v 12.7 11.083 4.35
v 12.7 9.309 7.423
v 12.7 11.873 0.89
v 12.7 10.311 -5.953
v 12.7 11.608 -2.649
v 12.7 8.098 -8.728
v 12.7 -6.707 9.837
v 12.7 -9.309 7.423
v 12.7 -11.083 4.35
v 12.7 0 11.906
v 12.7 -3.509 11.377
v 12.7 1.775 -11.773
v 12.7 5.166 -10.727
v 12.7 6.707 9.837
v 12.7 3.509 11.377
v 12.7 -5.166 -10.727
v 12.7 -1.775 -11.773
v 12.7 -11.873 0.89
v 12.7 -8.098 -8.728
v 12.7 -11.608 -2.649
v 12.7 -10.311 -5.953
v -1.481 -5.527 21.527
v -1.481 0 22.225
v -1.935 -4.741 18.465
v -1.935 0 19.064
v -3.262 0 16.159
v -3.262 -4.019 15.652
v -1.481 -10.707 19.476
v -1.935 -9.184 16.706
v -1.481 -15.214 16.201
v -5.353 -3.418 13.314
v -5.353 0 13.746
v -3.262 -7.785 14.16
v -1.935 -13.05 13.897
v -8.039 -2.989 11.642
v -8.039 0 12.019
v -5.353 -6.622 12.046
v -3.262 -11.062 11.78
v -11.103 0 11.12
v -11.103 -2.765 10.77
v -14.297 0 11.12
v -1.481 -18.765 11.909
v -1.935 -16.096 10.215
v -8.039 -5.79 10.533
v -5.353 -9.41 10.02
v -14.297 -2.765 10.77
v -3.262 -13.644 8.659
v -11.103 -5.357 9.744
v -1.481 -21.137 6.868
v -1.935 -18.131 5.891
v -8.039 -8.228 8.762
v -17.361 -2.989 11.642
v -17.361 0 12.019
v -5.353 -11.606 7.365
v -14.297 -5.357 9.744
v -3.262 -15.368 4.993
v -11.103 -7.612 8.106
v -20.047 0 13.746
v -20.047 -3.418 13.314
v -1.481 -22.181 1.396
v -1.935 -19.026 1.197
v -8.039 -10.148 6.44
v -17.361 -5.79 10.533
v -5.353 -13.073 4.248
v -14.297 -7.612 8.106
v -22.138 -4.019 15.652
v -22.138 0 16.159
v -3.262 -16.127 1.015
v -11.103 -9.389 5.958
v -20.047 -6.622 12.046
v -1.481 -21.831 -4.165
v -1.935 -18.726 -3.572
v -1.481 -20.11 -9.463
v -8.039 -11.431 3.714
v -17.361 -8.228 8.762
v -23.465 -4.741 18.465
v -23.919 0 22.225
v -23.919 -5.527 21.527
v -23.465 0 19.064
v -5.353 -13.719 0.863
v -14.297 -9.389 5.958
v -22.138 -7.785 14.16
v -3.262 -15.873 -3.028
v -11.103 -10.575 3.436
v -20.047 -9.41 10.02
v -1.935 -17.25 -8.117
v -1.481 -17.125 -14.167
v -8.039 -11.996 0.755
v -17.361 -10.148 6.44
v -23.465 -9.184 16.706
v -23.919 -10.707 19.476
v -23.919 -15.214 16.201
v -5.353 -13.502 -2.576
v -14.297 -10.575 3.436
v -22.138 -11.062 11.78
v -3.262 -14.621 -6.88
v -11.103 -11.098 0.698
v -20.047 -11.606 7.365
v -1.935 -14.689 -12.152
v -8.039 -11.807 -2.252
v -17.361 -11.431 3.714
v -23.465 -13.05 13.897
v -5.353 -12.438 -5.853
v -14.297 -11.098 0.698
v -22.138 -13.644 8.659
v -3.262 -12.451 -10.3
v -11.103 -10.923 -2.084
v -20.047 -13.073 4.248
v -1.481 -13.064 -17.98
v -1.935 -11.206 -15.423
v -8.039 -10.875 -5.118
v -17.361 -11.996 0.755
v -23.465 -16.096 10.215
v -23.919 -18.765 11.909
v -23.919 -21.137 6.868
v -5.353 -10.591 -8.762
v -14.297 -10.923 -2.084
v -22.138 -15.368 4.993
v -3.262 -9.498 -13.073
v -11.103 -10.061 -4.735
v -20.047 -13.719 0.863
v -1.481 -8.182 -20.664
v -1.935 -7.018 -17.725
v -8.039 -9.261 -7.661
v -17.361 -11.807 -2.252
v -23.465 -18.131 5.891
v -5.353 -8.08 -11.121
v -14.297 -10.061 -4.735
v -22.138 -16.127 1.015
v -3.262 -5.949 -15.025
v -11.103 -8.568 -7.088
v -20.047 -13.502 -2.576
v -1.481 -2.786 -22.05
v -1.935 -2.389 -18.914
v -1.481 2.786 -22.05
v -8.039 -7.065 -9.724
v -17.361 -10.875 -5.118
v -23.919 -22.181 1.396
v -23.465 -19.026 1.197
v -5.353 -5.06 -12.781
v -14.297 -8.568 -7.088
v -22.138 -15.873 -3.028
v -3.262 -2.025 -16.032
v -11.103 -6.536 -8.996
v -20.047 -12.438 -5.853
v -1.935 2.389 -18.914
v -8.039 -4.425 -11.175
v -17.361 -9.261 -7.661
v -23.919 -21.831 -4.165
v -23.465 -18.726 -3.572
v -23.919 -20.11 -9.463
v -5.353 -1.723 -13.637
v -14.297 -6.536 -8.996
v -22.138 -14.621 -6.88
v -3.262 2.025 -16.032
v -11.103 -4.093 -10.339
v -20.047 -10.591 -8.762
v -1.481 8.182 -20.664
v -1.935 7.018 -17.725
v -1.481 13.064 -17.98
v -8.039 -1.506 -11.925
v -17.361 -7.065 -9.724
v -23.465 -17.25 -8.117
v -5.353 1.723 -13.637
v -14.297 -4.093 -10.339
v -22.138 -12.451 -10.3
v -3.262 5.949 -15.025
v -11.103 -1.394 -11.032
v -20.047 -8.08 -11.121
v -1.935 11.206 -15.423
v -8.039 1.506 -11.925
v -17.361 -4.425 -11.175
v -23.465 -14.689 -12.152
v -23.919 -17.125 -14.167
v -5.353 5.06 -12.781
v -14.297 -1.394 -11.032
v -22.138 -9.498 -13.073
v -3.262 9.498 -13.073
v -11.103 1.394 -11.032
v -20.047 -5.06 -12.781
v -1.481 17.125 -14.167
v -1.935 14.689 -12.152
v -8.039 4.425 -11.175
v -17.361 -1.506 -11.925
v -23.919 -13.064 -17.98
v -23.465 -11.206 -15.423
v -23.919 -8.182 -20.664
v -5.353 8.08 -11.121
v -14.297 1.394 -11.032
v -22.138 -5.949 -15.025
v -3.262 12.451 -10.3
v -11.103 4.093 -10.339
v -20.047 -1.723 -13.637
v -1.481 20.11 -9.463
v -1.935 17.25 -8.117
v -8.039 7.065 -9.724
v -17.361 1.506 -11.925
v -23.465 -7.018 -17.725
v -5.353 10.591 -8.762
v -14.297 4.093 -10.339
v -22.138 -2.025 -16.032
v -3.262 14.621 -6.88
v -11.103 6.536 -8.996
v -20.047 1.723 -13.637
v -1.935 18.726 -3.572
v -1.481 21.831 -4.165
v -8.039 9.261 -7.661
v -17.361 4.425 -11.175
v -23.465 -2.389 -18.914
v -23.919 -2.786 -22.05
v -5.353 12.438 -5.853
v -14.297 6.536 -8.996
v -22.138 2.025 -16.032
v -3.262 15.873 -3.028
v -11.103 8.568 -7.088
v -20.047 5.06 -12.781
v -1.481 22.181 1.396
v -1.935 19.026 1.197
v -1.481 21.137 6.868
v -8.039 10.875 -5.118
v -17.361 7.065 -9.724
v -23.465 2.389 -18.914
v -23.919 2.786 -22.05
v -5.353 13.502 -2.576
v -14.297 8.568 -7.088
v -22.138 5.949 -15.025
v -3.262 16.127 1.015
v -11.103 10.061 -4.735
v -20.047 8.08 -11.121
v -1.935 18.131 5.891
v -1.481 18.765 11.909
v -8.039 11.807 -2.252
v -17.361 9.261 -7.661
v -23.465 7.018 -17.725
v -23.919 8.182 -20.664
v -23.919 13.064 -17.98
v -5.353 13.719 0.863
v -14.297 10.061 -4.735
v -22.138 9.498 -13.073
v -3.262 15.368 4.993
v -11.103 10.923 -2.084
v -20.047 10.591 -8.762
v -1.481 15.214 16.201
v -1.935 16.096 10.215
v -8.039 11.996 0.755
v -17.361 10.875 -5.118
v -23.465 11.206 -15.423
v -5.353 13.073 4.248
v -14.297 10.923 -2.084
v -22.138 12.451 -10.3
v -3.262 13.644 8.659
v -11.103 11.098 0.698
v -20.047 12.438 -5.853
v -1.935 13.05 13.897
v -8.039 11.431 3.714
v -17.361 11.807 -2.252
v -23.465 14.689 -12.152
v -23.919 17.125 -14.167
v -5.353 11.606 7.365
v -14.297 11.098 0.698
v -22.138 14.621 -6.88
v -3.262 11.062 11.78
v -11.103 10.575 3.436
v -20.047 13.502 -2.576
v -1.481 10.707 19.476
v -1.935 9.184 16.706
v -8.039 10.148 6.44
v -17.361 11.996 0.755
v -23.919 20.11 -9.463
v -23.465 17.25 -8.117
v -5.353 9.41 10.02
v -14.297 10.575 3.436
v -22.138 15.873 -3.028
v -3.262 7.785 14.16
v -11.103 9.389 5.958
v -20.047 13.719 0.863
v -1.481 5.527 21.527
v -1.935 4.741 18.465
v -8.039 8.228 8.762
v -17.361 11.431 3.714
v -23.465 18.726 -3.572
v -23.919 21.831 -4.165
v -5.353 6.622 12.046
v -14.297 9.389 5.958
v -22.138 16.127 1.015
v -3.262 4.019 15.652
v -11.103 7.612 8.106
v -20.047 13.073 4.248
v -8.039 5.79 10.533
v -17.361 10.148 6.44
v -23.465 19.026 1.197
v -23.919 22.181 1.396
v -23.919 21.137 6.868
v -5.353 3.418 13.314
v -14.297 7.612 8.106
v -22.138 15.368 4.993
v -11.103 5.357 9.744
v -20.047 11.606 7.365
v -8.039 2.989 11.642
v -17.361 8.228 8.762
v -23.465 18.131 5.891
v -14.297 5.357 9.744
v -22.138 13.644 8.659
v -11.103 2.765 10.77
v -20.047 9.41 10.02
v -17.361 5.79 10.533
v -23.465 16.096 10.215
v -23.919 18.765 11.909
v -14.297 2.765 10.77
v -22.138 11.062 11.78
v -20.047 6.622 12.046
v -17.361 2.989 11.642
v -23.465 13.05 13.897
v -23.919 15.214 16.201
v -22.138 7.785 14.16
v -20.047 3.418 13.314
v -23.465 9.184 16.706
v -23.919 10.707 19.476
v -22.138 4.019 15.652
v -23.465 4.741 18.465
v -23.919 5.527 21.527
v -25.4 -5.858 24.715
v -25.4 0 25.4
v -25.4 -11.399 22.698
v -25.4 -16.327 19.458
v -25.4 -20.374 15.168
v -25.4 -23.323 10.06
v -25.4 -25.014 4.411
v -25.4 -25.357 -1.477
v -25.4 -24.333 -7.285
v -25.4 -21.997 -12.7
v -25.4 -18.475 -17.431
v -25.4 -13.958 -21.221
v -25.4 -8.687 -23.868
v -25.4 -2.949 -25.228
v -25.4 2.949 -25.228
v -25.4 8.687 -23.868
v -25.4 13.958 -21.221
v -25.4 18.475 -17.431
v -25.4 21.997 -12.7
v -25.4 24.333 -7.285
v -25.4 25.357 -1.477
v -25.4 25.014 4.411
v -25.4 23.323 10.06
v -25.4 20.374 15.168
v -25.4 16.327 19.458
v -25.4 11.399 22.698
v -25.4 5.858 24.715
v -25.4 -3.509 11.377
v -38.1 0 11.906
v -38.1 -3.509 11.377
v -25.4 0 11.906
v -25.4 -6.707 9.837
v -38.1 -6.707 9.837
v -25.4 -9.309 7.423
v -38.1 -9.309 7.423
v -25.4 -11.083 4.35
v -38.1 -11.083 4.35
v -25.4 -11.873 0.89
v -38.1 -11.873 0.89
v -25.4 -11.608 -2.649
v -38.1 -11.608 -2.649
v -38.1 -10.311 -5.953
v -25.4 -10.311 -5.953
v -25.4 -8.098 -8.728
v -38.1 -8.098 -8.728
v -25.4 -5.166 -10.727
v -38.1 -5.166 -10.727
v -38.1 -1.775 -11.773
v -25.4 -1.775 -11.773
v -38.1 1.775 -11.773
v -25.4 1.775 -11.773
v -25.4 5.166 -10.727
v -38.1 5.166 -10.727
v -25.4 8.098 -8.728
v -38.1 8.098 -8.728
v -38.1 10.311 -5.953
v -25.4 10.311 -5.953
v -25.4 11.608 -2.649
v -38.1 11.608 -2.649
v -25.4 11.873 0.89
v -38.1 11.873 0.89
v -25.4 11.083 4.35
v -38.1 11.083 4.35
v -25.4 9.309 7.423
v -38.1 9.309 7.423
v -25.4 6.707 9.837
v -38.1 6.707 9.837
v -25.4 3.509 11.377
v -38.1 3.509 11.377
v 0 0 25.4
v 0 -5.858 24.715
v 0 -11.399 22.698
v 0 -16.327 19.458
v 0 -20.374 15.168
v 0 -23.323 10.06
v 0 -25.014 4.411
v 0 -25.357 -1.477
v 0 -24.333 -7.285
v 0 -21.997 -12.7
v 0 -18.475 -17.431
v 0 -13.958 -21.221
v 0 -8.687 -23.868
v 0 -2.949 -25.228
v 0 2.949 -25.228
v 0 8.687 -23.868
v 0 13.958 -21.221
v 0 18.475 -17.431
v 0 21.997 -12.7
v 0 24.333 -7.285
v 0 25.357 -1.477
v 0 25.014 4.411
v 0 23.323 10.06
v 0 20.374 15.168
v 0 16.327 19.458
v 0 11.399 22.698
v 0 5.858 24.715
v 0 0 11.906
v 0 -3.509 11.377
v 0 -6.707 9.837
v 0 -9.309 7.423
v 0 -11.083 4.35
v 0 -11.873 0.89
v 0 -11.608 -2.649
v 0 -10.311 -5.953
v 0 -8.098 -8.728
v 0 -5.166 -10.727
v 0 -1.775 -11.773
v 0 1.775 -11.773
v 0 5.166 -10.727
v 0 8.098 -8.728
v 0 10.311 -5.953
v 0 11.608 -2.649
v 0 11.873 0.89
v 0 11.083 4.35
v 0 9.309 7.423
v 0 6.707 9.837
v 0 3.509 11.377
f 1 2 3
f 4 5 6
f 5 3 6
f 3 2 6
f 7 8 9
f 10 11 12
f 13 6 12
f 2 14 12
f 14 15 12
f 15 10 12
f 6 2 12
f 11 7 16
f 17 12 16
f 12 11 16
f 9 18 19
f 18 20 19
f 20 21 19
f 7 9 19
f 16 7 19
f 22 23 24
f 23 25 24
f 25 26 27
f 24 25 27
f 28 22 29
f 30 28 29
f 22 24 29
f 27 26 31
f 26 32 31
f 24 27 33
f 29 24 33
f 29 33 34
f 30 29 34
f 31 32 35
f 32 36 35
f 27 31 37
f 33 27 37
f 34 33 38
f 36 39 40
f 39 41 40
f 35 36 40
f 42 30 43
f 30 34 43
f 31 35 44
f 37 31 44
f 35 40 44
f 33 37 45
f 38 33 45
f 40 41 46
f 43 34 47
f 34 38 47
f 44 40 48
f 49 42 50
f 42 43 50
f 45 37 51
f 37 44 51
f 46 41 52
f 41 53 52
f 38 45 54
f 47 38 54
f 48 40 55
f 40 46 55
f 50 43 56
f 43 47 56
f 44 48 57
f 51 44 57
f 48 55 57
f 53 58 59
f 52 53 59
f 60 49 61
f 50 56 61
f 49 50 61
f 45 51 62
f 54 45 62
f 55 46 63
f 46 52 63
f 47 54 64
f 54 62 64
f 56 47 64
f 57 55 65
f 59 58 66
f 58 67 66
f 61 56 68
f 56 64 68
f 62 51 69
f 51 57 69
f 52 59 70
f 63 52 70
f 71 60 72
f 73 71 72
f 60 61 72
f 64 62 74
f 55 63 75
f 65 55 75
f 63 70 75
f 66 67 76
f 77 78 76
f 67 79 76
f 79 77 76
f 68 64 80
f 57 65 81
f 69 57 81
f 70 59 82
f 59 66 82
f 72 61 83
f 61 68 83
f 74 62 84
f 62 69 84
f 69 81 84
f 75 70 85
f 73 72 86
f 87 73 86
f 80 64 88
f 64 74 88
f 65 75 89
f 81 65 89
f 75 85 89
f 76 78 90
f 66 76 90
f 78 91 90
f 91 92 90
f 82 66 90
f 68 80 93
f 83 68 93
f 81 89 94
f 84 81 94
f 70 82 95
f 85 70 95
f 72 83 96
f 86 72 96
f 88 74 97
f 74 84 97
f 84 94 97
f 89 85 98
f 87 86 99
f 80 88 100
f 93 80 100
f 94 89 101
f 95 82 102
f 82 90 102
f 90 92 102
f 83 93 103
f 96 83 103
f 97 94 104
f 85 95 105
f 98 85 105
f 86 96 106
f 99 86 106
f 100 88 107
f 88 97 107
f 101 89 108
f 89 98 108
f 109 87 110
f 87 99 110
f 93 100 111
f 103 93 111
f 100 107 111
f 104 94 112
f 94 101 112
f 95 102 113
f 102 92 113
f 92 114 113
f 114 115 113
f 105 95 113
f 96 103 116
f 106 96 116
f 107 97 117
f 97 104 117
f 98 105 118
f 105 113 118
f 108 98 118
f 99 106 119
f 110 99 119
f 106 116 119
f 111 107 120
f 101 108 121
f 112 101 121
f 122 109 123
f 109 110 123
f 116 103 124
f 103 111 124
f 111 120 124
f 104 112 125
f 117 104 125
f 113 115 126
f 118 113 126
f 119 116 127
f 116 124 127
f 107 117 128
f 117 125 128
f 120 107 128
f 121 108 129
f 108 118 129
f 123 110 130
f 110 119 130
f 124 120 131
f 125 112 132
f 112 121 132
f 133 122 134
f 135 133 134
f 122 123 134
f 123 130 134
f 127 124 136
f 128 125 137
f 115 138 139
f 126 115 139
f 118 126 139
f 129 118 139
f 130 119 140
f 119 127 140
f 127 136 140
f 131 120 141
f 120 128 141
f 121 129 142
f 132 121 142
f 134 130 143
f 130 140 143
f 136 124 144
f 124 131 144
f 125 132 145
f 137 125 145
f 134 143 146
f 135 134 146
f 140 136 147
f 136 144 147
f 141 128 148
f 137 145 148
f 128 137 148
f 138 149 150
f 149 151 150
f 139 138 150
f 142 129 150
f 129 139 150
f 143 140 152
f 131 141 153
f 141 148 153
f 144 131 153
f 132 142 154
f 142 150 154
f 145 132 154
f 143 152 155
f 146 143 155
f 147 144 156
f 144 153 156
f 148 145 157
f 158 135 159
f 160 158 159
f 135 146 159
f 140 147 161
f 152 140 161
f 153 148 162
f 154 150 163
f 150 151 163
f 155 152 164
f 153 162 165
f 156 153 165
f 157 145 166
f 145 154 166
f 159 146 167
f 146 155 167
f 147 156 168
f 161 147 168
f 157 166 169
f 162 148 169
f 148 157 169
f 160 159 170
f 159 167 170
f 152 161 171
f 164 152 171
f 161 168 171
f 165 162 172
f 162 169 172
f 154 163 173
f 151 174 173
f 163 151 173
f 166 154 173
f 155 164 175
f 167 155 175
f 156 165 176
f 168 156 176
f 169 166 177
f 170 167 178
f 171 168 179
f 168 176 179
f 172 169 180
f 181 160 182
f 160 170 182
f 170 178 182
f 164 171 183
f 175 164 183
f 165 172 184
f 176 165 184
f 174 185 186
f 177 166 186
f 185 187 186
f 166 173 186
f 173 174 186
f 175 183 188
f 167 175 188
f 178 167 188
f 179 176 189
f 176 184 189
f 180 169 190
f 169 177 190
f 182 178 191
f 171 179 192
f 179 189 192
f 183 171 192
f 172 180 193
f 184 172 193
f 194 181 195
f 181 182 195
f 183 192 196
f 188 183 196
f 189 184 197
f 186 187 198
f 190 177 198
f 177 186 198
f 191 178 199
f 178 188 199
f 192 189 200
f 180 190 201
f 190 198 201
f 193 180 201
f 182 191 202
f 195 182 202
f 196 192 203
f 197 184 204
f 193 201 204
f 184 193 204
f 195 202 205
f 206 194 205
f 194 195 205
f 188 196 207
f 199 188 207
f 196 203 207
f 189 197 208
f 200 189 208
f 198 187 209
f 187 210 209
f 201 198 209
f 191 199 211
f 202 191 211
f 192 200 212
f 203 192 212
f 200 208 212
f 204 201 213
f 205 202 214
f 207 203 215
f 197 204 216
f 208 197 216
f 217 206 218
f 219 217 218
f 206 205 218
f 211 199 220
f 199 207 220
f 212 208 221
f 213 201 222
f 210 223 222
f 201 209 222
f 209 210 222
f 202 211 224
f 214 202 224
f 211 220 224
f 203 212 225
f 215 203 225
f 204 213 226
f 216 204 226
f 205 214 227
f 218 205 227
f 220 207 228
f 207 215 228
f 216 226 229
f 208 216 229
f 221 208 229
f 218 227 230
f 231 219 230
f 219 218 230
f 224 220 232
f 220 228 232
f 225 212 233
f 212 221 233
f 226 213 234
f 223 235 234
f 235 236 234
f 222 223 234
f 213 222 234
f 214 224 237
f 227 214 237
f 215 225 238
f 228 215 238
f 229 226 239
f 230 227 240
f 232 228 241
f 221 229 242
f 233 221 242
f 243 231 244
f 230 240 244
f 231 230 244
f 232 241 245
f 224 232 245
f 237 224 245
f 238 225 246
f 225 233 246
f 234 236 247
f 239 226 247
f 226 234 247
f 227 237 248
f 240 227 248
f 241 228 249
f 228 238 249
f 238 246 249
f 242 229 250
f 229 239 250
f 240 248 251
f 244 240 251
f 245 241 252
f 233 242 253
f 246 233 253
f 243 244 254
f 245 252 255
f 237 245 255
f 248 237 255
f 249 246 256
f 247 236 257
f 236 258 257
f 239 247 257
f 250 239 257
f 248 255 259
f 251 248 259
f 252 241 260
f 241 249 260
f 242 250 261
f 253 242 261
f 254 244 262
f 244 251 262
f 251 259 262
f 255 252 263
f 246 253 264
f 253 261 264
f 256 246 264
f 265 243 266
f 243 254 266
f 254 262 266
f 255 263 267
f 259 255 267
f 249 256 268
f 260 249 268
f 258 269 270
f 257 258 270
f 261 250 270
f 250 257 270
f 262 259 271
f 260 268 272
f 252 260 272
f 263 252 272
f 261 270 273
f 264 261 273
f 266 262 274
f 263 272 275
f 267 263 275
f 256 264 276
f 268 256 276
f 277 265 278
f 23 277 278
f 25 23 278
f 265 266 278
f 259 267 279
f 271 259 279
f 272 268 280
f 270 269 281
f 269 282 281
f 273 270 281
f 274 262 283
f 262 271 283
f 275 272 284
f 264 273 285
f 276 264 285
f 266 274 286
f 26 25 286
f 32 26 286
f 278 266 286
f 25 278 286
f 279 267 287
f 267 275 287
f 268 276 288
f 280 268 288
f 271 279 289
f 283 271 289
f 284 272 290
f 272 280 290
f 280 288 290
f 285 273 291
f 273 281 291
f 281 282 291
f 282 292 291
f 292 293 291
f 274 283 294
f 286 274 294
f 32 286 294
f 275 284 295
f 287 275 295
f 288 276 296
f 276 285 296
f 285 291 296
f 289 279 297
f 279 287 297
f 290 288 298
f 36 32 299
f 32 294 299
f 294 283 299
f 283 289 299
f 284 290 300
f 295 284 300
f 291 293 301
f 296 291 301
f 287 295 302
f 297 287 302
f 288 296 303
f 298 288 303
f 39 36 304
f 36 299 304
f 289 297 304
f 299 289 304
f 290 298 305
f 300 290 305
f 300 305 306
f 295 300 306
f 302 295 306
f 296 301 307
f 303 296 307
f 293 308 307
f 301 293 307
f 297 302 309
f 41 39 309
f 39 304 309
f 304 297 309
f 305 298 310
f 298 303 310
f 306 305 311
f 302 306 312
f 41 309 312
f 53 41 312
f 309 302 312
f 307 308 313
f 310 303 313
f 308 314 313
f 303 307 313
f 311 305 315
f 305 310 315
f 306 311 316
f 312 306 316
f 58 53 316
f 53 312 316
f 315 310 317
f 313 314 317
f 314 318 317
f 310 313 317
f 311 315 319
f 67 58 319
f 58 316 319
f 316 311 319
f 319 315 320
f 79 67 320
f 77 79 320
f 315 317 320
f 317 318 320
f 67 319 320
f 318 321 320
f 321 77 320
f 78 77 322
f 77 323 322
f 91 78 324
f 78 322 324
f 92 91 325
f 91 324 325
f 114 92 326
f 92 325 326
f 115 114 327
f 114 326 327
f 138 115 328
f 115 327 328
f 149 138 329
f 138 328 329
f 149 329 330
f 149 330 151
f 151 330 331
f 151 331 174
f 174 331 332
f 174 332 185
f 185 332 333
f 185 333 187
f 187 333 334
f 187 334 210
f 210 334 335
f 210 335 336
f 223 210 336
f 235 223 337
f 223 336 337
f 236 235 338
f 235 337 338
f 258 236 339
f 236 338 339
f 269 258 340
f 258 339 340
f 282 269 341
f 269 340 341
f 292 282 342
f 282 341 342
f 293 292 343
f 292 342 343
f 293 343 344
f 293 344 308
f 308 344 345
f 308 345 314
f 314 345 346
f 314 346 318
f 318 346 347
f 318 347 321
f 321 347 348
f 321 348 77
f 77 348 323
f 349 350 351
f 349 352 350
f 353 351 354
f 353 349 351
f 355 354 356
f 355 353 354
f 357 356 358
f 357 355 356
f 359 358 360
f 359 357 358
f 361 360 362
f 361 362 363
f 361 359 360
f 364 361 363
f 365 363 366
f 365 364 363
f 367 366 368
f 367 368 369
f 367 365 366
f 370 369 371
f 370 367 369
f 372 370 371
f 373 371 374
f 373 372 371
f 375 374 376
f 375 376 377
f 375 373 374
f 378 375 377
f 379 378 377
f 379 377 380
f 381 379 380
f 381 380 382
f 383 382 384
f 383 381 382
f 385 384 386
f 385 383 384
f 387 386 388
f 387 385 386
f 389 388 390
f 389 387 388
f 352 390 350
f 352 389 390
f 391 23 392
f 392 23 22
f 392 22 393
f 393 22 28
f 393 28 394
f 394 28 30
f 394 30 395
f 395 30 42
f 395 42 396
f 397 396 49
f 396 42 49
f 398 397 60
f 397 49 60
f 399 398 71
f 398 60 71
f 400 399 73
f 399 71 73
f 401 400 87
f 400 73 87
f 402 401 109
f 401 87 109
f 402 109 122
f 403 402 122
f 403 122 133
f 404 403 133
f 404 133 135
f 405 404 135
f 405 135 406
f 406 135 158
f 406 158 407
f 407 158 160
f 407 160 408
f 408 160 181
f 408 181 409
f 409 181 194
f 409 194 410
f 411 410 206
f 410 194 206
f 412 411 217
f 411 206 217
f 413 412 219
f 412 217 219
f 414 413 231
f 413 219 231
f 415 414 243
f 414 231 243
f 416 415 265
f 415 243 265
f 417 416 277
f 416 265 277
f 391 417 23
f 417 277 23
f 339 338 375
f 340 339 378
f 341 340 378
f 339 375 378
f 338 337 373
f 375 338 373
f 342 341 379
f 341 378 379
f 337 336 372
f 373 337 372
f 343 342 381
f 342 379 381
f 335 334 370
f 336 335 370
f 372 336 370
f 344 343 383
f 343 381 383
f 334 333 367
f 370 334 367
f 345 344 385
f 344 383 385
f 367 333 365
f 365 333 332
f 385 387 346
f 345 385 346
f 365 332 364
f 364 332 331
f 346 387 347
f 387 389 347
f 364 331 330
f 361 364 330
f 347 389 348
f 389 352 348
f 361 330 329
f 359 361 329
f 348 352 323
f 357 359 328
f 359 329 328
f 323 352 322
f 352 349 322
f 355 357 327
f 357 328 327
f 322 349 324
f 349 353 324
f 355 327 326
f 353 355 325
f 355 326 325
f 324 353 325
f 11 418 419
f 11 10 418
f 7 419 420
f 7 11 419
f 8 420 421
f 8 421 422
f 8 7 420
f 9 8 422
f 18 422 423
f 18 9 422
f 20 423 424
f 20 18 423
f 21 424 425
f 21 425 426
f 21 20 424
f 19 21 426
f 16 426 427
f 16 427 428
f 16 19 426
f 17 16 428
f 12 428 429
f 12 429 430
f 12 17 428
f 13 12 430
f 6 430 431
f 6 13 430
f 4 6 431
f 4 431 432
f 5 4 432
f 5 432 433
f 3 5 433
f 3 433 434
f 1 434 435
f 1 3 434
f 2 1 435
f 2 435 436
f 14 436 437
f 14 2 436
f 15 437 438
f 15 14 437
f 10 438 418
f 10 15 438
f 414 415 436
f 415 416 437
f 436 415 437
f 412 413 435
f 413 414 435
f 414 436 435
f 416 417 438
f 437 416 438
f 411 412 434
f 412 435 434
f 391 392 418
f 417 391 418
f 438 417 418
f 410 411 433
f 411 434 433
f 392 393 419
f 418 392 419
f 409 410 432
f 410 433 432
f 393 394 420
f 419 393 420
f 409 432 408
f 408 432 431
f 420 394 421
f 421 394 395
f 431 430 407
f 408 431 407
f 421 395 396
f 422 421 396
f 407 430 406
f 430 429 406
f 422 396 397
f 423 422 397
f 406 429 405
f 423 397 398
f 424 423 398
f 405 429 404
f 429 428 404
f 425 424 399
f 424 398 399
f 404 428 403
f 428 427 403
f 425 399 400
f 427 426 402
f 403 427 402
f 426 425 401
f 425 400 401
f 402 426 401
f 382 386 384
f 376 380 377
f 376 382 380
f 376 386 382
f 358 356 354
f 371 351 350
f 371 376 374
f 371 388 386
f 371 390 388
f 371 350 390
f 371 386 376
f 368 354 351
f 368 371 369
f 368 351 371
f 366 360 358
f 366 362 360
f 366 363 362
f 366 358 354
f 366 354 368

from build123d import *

# Parameters (mm, degrees)
F0_W = 12.7
F0_H = 11.90625


with BuildPart() as f1:
    # F0 (on Front) → F1 (revolve)
    with BuildSketch(Plane.XZ):
        with Locations((-31.75, 5.953125)):
            Rectangle(F0_W, F0_H)
        with BuildLine():
            Line((-25.4, 11.90625), (-25.4, 0))
            Line((-25.4, 0), (0, 0))
            Line((0, 0), (0, 11.90625))
            Line((0, 11.90625), (0, 25.4))
            Line((0, 25.4), (-1.480527, 22.225))
            ThreePointArc((-1.480527, 22.225), (-12.7, 11.005527), (-23.919473, 22.225))
            Line((-23.919473, 22.225), (-25.4, 25.4))
            Line((-25.4, 25.4), (-25.4, 11.90625))
        make_face()
        with Locations((6.35, 5.953125)):
            Rectangle(F0_W, F0_H)
    revolve(axis=Axis((-11.84914, 0, 0), (1, 0, 0)))


solid = f1.part
